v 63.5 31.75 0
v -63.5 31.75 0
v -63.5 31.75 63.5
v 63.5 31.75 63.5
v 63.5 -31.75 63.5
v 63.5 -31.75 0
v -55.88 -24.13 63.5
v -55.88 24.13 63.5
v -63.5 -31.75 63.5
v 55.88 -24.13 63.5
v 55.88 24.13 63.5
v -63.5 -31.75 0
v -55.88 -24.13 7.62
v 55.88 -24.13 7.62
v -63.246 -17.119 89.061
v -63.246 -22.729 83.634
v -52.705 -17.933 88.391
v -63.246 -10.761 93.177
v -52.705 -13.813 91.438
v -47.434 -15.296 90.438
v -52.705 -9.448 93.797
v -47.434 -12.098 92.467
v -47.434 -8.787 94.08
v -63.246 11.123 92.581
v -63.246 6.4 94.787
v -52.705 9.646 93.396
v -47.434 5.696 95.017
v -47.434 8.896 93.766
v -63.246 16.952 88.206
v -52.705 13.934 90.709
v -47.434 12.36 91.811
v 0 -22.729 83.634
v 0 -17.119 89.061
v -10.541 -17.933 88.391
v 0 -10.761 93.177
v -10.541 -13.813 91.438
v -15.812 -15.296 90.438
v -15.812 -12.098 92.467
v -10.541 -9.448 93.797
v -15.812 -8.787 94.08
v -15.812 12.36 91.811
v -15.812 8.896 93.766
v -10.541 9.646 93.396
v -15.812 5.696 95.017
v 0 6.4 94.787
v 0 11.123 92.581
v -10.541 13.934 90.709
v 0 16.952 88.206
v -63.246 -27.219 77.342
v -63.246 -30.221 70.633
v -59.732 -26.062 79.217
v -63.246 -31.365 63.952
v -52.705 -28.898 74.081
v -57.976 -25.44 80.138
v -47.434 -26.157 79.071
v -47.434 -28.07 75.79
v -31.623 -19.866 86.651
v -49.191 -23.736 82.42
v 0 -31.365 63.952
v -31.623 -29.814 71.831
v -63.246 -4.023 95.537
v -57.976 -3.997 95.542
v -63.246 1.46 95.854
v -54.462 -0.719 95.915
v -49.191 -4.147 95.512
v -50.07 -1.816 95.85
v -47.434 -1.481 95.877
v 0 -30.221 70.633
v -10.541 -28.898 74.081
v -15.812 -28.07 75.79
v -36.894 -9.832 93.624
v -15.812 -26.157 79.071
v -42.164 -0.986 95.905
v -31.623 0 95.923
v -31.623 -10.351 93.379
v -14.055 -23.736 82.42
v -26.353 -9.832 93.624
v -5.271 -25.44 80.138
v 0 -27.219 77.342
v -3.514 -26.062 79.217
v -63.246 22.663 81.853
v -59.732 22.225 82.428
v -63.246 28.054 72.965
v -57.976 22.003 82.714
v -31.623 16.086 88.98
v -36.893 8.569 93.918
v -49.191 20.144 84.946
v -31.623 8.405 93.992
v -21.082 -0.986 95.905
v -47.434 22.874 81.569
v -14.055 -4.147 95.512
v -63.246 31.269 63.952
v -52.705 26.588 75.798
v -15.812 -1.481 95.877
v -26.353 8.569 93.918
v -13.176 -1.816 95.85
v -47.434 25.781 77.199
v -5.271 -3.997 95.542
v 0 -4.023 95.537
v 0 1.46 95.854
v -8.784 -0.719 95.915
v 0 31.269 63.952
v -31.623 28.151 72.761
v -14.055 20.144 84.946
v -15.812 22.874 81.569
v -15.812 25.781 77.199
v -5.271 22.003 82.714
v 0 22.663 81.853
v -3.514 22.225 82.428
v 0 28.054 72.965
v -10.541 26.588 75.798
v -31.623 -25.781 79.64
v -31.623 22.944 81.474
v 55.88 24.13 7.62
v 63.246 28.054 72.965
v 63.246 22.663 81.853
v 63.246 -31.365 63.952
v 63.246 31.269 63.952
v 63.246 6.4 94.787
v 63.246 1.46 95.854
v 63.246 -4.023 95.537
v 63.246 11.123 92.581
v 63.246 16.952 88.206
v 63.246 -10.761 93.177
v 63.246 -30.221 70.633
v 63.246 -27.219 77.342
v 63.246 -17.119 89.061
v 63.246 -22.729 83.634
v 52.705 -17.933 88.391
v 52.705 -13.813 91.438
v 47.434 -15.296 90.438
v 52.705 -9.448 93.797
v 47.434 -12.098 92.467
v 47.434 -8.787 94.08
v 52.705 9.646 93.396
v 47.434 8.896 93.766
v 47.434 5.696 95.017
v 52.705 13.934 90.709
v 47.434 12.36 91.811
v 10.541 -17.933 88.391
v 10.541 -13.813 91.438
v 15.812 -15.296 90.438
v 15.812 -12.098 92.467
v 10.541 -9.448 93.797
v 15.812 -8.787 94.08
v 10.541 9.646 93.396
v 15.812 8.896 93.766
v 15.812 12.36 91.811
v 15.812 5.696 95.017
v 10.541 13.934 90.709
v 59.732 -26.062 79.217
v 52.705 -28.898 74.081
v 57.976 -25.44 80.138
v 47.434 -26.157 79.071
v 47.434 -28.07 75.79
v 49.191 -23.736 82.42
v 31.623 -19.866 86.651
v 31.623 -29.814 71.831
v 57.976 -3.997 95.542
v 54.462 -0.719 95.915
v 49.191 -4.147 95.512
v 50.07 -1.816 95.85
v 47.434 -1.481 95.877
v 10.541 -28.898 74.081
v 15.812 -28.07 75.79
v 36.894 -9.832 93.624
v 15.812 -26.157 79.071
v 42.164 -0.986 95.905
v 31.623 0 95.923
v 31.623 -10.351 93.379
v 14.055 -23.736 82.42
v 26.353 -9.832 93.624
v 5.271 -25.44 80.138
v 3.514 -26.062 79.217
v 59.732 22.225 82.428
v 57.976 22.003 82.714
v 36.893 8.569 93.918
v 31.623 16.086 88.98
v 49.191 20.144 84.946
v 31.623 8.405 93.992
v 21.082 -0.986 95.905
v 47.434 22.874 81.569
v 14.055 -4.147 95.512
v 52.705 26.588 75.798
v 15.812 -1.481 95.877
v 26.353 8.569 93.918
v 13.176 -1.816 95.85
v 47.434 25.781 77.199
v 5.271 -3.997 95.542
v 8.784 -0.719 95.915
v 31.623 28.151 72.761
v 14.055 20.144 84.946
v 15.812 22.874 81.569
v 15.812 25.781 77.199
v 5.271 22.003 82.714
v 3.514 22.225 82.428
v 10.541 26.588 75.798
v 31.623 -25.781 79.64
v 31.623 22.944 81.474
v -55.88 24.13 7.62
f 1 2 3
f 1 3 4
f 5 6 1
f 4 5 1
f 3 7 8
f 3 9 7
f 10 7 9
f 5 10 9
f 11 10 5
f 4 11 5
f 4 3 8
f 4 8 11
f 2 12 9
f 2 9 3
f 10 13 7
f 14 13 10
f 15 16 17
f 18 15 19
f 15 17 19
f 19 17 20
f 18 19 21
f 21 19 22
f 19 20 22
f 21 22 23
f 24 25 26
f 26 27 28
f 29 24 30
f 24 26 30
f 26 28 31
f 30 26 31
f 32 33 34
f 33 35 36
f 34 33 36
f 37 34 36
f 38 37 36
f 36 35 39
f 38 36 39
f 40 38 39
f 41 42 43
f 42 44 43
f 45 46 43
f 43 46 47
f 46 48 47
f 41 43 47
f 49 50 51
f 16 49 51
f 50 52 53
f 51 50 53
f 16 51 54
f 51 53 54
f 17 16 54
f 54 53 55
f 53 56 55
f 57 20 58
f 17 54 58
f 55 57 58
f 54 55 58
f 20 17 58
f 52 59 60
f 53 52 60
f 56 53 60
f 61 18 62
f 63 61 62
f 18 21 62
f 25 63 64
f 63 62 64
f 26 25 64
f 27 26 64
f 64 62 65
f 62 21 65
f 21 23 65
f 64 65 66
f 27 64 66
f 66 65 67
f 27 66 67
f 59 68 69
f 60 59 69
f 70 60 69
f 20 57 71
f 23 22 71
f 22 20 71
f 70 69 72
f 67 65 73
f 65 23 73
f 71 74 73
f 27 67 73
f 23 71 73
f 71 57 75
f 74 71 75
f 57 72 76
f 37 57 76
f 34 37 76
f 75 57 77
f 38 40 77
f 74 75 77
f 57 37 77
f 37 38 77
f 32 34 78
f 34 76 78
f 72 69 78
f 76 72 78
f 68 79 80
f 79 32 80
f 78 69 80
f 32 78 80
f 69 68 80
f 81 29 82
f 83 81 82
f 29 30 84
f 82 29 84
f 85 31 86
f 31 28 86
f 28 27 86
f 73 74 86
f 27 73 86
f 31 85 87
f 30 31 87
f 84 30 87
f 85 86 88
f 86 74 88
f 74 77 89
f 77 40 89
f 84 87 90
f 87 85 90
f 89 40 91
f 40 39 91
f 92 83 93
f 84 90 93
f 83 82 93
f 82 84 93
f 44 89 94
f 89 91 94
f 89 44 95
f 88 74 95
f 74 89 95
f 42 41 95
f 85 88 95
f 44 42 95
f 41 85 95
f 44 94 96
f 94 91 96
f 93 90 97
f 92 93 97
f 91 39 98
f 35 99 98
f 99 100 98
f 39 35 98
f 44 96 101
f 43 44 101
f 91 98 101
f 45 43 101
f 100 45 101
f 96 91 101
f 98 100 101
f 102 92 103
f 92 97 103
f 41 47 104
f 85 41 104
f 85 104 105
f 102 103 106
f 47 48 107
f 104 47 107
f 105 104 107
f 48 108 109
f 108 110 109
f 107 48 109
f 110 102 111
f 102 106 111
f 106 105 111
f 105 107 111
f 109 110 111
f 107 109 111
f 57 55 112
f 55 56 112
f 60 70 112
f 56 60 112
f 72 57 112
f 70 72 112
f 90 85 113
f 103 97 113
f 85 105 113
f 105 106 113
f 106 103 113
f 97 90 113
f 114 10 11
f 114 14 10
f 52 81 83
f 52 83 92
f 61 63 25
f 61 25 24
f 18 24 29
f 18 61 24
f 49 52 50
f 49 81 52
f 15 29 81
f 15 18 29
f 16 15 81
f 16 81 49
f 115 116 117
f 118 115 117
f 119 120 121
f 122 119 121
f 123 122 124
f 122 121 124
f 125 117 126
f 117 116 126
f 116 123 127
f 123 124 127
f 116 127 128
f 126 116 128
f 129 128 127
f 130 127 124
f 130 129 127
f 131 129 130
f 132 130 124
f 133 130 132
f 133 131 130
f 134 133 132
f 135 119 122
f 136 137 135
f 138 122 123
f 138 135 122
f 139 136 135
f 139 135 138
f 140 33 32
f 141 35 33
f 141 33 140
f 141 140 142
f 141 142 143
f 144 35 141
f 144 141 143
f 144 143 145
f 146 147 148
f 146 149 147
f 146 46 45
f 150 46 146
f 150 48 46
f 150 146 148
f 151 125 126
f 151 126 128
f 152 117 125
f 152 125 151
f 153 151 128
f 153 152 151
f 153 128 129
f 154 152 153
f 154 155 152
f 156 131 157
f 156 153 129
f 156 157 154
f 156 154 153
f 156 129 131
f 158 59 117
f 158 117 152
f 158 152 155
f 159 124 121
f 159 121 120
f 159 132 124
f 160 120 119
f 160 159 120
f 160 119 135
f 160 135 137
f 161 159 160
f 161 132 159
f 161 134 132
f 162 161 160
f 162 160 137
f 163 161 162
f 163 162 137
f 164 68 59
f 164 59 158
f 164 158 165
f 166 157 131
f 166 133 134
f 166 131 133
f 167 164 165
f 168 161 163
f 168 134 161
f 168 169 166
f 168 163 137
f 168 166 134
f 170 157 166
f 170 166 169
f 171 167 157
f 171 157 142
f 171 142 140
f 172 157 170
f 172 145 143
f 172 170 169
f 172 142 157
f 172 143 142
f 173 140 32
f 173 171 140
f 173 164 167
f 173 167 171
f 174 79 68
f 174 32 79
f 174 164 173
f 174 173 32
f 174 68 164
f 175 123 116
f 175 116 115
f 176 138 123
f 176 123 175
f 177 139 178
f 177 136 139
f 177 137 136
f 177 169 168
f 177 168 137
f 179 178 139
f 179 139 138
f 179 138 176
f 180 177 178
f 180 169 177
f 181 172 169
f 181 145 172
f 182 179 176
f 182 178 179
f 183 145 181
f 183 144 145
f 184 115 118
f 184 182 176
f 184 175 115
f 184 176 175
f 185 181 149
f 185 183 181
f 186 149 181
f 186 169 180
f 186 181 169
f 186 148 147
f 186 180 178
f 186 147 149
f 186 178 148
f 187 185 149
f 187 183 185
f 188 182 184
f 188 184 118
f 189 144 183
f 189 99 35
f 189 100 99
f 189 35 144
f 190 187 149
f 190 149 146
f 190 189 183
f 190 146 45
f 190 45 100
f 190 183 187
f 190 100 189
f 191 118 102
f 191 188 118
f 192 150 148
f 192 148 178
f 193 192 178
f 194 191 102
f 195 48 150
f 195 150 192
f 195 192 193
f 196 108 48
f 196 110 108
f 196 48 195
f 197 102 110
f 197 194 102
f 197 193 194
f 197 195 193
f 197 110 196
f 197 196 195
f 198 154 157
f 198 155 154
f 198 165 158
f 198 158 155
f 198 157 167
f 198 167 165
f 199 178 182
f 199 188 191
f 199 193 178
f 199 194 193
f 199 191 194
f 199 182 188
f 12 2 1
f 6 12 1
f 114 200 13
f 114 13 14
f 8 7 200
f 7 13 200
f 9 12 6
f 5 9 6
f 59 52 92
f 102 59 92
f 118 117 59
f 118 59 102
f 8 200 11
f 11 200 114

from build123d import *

# Parameters (mm, degrees)
F0_W          = 127
F0_H          = 63.5
F1_DEPTH      = 63.5
F2_T          = -7.62
F4_DEPTH      = 63.246
F4_DEPTH_BACK = 63.246


with BuildPart() as f1:
    # F0 (on Top) → F1 (new body)
    with BuildSketch(Plane.XY):
        Rectangle(F0_W, F0_H)
    extrude(amount=F1_DEPTH)

    # F2
    f2_openings = [f1.faces().sort_by_distance(p)[0] for p in [
        (0, 0, 63.5),
    ]]
    offset(amount=F2_T, openings=f2_openings)


with BuildPart() as f4:
    # F3 (on Right) → F4 (new body, two sides)
    with BuildSketch(Plane.YZ) as f4_sk:
        with BuildLine():
            add(Edge.make_bspline(
                [(-31.3647463918, 63.9516413212), (-31.1634073466, 78.2752707222), (1.5018892992, 113.7911647147), (28.1152354193, 77.8360987048), (31.2689505517, 63.9516413212)],
                knots=[0, 0, 0, 0, 0.5001872267, 1, 1, 1, 1], degree=3))
            Line((-31.3647463918, 63.9516413212), (31.2689505517, 63.9516413212))
        make_face()
    extrude(amount=F4_DEPTH)
    extrude(f4_sk.sketch, amount=-F4_DEPTH_BACK)


solid = Compound([f1.part, f4.part])
